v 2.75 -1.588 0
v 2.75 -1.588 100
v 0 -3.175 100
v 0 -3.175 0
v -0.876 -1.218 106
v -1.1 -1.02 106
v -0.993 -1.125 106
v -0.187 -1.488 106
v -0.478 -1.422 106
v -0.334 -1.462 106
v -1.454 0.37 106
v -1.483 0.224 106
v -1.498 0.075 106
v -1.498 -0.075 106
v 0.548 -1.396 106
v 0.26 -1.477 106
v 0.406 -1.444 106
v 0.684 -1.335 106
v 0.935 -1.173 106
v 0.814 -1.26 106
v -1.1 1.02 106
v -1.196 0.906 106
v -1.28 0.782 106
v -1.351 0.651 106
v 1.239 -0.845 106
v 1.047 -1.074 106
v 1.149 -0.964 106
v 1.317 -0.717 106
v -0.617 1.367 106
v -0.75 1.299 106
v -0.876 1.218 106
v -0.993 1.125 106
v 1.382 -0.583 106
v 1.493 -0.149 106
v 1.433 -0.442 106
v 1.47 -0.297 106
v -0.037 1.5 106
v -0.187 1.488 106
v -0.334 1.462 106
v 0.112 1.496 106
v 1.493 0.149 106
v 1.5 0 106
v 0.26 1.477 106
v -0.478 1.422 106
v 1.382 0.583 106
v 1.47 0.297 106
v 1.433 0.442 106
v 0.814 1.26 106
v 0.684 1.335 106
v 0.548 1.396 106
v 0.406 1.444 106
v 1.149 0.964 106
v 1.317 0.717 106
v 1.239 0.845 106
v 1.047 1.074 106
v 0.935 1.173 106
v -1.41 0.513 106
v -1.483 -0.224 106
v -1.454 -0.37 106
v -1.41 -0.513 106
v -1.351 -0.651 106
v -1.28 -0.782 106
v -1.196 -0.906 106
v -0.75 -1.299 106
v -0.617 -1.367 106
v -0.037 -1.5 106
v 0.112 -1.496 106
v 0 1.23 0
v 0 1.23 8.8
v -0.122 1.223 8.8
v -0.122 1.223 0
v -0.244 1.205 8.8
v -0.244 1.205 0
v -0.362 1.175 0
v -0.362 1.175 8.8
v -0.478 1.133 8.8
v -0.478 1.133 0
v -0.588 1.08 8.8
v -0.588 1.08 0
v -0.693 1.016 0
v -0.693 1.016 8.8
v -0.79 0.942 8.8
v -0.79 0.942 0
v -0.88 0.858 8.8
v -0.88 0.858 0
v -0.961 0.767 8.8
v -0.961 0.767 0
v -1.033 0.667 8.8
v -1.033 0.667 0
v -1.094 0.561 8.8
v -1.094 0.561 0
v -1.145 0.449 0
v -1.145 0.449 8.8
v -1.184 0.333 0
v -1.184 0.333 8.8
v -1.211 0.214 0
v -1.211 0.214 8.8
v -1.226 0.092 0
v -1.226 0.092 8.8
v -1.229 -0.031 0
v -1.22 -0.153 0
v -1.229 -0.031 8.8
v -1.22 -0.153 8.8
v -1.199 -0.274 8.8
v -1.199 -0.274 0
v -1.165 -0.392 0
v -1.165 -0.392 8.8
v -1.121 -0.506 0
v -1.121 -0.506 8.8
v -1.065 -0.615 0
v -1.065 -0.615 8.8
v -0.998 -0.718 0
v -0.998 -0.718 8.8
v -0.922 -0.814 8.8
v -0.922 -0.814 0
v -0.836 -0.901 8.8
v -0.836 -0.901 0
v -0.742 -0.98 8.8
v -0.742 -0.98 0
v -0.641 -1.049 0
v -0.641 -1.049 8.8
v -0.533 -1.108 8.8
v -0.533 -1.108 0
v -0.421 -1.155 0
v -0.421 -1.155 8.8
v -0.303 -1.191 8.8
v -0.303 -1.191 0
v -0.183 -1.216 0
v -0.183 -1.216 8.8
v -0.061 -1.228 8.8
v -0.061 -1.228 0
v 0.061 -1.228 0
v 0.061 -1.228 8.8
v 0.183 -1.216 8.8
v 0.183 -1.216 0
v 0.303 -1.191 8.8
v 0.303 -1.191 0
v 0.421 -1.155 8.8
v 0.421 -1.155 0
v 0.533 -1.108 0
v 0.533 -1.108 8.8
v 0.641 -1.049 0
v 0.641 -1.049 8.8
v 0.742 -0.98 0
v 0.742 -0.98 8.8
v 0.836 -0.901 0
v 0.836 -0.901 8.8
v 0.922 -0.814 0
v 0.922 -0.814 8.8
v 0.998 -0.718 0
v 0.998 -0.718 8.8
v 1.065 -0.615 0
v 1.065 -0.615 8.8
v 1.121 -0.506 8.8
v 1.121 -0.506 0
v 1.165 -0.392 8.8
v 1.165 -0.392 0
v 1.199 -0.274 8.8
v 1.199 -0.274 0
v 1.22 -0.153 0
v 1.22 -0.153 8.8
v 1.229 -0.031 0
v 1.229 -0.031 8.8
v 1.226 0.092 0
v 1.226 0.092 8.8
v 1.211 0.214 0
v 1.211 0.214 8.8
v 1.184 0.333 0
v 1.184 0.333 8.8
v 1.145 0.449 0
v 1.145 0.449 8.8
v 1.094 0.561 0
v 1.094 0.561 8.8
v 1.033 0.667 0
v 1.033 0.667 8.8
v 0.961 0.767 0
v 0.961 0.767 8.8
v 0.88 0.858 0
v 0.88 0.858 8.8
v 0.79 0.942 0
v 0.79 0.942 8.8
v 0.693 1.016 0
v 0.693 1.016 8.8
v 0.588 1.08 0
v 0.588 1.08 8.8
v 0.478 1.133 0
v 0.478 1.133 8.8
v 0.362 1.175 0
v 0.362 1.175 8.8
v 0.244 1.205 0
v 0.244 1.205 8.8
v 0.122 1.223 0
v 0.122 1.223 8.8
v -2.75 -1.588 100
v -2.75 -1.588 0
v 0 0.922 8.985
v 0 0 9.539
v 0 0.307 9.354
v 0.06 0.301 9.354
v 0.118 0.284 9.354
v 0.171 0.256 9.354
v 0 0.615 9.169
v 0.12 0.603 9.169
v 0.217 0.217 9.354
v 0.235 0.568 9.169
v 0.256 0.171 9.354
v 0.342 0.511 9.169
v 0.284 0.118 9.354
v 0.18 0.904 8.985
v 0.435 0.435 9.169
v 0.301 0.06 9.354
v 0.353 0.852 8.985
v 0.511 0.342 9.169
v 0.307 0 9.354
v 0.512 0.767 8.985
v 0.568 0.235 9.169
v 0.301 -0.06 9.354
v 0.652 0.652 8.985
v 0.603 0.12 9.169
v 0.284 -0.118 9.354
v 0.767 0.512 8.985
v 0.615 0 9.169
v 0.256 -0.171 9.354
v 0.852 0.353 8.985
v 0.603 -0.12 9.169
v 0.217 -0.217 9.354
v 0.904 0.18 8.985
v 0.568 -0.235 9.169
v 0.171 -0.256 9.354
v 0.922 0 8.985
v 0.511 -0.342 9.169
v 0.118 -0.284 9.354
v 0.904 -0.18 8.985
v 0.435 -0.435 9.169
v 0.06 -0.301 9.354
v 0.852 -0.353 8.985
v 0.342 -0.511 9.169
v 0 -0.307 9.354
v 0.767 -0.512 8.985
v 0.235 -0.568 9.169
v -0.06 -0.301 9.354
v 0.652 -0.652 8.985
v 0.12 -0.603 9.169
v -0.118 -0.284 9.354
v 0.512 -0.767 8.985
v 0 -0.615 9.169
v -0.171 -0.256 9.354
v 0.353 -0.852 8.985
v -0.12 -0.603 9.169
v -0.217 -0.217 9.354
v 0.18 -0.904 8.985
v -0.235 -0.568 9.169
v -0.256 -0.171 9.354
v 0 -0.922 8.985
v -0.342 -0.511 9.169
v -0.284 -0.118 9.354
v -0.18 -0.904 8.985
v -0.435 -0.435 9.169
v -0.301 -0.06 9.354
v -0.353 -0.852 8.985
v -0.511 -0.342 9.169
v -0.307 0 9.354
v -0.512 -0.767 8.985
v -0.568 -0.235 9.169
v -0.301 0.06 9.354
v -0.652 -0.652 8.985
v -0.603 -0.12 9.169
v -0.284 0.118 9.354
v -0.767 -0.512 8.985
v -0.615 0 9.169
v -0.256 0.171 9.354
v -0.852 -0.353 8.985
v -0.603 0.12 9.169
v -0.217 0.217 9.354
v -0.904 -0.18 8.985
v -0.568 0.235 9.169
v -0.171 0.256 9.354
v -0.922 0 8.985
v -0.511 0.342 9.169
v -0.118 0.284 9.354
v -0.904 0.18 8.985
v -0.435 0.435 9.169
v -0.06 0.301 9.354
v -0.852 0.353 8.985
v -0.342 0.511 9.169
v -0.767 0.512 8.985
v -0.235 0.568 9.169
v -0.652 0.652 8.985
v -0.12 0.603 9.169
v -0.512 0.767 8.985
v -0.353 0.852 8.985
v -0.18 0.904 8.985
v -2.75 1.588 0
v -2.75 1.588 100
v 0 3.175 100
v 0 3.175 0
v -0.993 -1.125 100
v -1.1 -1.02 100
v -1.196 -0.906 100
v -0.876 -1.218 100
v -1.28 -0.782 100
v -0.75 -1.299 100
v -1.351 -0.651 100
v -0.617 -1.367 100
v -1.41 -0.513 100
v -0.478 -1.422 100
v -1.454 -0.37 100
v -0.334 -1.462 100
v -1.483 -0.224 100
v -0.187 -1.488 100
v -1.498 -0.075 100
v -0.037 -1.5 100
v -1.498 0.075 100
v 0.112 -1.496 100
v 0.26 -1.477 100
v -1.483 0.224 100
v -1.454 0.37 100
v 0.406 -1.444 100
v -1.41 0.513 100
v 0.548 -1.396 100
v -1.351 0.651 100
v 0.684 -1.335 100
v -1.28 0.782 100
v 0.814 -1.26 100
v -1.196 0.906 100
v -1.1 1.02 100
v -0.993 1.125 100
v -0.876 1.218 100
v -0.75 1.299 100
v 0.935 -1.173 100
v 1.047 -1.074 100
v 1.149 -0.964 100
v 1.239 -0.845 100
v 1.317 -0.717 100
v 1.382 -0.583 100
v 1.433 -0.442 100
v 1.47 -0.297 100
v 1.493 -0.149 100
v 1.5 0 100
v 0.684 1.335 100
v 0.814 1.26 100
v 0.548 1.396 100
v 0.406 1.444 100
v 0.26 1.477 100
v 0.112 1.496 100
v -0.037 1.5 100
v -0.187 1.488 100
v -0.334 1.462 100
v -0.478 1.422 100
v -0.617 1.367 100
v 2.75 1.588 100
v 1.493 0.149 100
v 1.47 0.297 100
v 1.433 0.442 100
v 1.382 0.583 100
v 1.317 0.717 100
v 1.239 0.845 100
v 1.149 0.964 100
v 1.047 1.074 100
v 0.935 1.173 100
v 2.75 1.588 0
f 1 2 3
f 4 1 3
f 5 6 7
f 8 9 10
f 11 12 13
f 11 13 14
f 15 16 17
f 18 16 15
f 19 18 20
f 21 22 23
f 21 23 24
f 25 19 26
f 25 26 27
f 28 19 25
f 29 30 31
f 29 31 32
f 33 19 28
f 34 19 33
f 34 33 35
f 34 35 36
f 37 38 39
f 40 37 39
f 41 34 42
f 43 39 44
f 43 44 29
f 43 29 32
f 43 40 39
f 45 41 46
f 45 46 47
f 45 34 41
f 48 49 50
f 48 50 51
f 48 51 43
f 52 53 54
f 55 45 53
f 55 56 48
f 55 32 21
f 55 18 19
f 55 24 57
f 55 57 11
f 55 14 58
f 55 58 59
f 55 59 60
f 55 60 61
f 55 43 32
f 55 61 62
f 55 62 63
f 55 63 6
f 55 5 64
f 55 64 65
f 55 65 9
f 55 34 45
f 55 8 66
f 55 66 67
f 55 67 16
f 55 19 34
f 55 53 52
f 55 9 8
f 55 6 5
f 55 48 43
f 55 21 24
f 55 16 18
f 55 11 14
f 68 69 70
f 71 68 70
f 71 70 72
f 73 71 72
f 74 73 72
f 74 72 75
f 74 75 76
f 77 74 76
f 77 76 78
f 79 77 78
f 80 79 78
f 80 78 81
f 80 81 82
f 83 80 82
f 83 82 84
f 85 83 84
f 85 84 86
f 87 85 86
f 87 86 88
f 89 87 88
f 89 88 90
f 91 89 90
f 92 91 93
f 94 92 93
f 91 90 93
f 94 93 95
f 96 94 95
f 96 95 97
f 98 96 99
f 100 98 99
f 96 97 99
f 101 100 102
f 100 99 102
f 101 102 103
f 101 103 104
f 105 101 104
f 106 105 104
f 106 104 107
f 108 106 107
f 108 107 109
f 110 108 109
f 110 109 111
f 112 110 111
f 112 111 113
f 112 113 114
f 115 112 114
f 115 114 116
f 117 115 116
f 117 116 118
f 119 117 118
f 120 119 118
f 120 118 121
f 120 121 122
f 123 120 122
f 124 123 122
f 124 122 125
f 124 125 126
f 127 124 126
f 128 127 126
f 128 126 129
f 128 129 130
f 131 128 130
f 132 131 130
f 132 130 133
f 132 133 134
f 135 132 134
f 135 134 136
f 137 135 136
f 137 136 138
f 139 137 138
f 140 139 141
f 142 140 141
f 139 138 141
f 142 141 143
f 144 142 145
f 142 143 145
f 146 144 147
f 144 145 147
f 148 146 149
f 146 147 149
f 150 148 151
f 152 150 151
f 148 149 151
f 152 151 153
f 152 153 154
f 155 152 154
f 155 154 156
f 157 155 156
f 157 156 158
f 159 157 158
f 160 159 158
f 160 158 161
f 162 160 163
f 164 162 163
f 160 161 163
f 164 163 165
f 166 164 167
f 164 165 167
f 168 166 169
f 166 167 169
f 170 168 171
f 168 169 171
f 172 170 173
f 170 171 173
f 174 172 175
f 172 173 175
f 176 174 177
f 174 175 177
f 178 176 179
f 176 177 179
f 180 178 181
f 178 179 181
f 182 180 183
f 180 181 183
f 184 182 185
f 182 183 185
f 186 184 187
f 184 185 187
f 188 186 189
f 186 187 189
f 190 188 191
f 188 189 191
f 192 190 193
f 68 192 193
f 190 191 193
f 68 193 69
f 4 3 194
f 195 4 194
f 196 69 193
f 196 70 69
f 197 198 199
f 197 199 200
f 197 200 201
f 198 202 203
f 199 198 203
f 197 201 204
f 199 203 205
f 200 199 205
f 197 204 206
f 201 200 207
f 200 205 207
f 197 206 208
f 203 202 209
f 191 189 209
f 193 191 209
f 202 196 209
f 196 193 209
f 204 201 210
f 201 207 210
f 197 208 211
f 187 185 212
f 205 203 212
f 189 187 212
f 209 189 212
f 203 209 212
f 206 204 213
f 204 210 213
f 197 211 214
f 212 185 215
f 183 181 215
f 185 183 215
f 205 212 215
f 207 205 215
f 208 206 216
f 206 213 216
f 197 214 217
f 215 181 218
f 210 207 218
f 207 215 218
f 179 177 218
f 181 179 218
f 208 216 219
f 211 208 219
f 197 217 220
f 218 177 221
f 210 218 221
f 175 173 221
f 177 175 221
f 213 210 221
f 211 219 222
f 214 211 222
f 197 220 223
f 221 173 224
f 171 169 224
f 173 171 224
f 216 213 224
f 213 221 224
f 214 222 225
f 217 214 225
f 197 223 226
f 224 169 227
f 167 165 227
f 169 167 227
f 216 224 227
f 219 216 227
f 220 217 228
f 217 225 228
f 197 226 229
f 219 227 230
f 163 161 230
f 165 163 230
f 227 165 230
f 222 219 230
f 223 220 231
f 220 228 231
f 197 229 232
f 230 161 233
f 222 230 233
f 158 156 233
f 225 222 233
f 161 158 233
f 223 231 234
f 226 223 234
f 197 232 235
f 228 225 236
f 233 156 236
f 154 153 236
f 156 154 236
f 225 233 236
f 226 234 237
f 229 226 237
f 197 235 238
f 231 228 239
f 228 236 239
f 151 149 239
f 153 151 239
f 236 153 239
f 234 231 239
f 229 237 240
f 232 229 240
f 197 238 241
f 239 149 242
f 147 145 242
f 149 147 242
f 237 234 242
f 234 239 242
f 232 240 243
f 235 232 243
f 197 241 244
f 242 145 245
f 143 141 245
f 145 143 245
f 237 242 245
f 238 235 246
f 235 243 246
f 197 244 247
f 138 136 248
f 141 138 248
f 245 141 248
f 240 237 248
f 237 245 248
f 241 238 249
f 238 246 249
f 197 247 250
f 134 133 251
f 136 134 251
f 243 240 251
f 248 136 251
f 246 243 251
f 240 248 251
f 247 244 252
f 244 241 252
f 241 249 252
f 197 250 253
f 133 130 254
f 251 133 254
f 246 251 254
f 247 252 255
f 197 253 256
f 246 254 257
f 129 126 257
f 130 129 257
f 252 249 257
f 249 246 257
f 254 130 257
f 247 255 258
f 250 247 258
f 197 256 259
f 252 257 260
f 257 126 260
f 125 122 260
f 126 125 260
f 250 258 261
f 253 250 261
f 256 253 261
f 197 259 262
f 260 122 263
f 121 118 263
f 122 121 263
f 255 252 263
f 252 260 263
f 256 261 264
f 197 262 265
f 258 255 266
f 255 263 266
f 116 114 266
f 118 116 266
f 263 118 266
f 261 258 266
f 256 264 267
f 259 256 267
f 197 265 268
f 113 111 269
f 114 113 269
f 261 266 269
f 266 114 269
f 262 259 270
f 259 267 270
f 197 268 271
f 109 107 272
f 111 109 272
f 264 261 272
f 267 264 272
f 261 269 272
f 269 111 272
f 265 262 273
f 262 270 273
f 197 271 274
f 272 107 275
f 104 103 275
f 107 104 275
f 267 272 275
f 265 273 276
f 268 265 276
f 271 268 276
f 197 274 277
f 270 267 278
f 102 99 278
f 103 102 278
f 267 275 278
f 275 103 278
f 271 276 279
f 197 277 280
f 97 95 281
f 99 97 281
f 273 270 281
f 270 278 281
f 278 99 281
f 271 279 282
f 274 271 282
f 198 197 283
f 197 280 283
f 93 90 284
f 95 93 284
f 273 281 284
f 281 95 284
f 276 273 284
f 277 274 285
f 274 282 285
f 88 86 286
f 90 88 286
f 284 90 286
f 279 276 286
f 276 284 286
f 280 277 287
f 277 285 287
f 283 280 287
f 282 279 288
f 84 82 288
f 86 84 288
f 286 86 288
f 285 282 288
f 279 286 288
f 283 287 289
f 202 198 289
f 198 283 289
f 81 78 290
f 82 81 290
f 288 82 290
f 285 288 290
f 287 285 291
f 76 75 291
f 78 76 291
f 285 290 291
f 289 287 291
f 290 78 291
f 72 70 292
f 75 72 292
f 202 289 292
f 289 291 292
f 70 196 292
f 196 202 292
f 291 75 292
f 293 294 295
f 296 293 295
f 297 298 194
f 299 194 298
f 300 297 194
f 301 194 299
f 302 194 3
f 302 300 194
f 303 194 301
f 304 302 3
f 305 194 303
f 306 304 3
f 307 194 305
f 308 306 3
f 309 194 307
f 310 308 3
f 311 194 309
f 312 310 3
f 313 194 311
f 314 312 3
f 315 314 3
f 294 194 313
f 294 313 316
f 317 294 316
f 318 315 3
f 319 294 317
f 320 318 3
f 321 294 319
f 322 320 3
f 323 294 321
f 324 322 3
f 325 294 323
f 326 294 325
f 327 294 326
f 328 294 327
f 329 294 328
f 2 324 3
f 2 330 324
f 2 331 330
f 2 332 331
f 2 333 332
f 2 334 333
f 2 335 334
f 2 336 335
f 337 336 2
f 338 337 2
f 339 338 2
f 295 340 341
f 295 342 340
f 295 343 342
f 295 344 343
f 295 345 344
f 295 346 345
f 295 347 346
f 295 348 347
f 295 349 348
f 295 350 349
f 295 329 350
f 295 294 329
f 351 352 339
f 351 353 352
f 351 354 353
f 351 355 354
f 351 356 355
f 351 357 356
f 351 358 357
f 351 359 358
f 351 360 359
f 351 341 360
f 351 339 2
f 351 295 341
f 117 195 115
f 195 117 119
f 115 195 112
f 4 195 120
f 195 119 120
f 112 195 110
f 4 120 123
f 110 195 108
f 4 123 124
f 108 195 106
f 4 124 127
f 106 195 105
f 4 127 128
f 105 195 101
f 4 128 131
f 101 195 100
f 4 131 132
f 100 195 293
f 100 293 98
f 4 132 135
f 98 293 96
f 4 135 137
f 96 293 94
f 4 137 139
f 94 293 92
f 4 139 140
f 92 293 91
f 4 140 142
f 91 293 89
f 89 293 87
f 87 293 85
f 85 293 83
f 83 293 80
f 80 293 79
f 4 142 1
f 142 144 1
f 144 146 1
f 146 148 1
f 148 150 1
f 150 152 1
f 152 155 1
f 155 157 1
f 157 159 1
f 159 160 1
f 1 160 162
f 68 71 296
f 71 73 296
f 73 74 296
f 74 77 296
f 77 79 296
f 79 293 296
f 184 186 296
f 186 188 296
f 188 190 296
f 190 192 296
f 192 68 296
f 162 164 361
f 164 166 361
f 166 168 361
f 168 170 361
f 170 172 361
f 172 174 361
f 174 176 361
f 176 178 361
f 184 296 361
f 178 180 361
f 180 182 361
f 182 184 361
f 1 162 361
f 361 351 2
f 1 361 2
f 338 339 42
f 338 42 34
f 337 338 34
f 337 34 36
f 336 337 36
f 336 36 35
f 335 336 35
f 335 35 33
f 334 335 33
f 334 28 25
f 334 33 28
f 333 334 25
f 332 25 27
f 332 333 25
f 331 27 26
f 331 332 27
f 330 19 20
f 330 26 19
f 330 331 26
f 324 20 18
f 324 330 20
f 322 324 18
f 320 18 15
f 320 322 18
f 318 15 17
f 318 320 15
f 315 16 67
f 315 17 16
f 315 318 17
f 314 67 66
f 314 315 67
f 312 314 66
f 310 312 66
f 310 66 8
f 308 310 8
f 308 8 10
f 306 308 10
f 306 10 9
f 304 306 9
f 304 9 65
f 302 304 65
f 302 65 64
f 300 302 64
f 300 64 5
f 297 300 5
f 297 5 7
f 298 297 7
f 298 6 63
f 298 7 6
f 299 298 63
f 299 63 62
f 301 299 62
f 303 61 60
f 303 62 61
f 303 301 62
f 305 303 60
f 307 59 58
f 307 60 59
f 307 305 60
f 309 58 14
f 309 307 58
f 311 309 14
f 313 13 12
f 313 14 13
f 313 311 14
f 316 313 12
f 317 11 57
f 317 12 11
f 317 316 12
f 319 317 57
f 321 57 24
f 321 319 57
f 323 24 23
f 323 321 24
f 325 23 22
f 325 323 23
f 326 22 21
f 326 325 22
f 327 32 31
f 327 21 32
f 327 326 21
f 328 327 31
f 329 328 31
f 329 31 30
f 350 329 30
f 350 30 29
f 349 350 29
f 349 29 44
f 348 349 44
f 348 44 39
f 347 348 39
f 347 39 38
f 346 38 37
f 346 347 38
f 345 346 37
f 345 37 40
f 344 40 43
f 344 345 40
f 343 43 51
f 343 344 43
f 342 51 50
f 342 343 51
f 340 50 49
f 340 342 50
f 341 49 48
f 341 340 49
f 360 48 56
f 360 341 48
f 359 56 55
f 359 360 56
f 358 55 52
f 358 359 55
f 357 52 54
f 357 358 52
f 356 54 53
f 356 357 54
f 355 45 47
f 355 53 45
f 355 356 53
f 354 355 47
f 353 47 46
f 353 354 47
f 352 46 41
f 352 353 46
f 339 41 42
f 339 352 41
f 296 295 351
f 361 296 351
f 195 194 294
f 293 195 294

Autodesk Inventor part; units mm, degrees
ref_plane "YZ Plane" through (0, 0, 0) normal (1, 0, 0) x (0, 1, 0)
ref_plane "XZ Plane" through (0, 0, 0) normal (0, 1, 0) x (-1, 0, 0)
ref_plane "XY Plane" through (0, 0, 0) normal (0, 0, 1) x (1, 0, 0)
sketch "スケッチ1" plane through (0, 0, 0) normal (0, 0, 1) x (1, 0, 0)
  line L0 (0, 3.1754) -> (2.75, 1.5877)
  line L1 (2.75, 1.5877) -> (2.75, -1.5877)
  line L2 (2.75, -1.5877) -> (0, -3.1754)
  line L3 (0, -3.1754) -> (-2.75, -1.5877)
  line L4 (-2.75, -1.5877) -> (-2.75, 1.5877)
  line L5 (-2.75, 1.5877) -> (0, 3.1754)
  point P0 (0, 0)
  point P1 (0, 0)
  dimension "d0" = 5.5
extrude "押し出し1" add sketch "スケッチ1" along normal blind 100
sketch "スケッチ2" plane through (0, 0, 100) normal (0, 0, 1) x (1, 0, 0)
  circle A0 centre (0, 0) radius 1.5
  dimension "d3" = 3
extrude "押し出し2" add sketch "スケッチ2" along normal blind 6
thread "ねじ1" size "M3x0.5" class "6g" standard "ANSI Metric M Profile" full length
sketch "スケッチ3" plane through (0, 0, 0) normal (0, 0, -1) x (-1, 0, 0)
  point P0 (0, 0)
hole "穴1" at (0, 0, 0) direction (0, 0, 1) diameter 2.459 depth 8.8 tip angle 118 thread size "M3x0.5" class "6H" standard "ISO Metric profile"
properties part number "ステンレススペーサー（六角）_BSU-3100" material "ステンレス鋼"
